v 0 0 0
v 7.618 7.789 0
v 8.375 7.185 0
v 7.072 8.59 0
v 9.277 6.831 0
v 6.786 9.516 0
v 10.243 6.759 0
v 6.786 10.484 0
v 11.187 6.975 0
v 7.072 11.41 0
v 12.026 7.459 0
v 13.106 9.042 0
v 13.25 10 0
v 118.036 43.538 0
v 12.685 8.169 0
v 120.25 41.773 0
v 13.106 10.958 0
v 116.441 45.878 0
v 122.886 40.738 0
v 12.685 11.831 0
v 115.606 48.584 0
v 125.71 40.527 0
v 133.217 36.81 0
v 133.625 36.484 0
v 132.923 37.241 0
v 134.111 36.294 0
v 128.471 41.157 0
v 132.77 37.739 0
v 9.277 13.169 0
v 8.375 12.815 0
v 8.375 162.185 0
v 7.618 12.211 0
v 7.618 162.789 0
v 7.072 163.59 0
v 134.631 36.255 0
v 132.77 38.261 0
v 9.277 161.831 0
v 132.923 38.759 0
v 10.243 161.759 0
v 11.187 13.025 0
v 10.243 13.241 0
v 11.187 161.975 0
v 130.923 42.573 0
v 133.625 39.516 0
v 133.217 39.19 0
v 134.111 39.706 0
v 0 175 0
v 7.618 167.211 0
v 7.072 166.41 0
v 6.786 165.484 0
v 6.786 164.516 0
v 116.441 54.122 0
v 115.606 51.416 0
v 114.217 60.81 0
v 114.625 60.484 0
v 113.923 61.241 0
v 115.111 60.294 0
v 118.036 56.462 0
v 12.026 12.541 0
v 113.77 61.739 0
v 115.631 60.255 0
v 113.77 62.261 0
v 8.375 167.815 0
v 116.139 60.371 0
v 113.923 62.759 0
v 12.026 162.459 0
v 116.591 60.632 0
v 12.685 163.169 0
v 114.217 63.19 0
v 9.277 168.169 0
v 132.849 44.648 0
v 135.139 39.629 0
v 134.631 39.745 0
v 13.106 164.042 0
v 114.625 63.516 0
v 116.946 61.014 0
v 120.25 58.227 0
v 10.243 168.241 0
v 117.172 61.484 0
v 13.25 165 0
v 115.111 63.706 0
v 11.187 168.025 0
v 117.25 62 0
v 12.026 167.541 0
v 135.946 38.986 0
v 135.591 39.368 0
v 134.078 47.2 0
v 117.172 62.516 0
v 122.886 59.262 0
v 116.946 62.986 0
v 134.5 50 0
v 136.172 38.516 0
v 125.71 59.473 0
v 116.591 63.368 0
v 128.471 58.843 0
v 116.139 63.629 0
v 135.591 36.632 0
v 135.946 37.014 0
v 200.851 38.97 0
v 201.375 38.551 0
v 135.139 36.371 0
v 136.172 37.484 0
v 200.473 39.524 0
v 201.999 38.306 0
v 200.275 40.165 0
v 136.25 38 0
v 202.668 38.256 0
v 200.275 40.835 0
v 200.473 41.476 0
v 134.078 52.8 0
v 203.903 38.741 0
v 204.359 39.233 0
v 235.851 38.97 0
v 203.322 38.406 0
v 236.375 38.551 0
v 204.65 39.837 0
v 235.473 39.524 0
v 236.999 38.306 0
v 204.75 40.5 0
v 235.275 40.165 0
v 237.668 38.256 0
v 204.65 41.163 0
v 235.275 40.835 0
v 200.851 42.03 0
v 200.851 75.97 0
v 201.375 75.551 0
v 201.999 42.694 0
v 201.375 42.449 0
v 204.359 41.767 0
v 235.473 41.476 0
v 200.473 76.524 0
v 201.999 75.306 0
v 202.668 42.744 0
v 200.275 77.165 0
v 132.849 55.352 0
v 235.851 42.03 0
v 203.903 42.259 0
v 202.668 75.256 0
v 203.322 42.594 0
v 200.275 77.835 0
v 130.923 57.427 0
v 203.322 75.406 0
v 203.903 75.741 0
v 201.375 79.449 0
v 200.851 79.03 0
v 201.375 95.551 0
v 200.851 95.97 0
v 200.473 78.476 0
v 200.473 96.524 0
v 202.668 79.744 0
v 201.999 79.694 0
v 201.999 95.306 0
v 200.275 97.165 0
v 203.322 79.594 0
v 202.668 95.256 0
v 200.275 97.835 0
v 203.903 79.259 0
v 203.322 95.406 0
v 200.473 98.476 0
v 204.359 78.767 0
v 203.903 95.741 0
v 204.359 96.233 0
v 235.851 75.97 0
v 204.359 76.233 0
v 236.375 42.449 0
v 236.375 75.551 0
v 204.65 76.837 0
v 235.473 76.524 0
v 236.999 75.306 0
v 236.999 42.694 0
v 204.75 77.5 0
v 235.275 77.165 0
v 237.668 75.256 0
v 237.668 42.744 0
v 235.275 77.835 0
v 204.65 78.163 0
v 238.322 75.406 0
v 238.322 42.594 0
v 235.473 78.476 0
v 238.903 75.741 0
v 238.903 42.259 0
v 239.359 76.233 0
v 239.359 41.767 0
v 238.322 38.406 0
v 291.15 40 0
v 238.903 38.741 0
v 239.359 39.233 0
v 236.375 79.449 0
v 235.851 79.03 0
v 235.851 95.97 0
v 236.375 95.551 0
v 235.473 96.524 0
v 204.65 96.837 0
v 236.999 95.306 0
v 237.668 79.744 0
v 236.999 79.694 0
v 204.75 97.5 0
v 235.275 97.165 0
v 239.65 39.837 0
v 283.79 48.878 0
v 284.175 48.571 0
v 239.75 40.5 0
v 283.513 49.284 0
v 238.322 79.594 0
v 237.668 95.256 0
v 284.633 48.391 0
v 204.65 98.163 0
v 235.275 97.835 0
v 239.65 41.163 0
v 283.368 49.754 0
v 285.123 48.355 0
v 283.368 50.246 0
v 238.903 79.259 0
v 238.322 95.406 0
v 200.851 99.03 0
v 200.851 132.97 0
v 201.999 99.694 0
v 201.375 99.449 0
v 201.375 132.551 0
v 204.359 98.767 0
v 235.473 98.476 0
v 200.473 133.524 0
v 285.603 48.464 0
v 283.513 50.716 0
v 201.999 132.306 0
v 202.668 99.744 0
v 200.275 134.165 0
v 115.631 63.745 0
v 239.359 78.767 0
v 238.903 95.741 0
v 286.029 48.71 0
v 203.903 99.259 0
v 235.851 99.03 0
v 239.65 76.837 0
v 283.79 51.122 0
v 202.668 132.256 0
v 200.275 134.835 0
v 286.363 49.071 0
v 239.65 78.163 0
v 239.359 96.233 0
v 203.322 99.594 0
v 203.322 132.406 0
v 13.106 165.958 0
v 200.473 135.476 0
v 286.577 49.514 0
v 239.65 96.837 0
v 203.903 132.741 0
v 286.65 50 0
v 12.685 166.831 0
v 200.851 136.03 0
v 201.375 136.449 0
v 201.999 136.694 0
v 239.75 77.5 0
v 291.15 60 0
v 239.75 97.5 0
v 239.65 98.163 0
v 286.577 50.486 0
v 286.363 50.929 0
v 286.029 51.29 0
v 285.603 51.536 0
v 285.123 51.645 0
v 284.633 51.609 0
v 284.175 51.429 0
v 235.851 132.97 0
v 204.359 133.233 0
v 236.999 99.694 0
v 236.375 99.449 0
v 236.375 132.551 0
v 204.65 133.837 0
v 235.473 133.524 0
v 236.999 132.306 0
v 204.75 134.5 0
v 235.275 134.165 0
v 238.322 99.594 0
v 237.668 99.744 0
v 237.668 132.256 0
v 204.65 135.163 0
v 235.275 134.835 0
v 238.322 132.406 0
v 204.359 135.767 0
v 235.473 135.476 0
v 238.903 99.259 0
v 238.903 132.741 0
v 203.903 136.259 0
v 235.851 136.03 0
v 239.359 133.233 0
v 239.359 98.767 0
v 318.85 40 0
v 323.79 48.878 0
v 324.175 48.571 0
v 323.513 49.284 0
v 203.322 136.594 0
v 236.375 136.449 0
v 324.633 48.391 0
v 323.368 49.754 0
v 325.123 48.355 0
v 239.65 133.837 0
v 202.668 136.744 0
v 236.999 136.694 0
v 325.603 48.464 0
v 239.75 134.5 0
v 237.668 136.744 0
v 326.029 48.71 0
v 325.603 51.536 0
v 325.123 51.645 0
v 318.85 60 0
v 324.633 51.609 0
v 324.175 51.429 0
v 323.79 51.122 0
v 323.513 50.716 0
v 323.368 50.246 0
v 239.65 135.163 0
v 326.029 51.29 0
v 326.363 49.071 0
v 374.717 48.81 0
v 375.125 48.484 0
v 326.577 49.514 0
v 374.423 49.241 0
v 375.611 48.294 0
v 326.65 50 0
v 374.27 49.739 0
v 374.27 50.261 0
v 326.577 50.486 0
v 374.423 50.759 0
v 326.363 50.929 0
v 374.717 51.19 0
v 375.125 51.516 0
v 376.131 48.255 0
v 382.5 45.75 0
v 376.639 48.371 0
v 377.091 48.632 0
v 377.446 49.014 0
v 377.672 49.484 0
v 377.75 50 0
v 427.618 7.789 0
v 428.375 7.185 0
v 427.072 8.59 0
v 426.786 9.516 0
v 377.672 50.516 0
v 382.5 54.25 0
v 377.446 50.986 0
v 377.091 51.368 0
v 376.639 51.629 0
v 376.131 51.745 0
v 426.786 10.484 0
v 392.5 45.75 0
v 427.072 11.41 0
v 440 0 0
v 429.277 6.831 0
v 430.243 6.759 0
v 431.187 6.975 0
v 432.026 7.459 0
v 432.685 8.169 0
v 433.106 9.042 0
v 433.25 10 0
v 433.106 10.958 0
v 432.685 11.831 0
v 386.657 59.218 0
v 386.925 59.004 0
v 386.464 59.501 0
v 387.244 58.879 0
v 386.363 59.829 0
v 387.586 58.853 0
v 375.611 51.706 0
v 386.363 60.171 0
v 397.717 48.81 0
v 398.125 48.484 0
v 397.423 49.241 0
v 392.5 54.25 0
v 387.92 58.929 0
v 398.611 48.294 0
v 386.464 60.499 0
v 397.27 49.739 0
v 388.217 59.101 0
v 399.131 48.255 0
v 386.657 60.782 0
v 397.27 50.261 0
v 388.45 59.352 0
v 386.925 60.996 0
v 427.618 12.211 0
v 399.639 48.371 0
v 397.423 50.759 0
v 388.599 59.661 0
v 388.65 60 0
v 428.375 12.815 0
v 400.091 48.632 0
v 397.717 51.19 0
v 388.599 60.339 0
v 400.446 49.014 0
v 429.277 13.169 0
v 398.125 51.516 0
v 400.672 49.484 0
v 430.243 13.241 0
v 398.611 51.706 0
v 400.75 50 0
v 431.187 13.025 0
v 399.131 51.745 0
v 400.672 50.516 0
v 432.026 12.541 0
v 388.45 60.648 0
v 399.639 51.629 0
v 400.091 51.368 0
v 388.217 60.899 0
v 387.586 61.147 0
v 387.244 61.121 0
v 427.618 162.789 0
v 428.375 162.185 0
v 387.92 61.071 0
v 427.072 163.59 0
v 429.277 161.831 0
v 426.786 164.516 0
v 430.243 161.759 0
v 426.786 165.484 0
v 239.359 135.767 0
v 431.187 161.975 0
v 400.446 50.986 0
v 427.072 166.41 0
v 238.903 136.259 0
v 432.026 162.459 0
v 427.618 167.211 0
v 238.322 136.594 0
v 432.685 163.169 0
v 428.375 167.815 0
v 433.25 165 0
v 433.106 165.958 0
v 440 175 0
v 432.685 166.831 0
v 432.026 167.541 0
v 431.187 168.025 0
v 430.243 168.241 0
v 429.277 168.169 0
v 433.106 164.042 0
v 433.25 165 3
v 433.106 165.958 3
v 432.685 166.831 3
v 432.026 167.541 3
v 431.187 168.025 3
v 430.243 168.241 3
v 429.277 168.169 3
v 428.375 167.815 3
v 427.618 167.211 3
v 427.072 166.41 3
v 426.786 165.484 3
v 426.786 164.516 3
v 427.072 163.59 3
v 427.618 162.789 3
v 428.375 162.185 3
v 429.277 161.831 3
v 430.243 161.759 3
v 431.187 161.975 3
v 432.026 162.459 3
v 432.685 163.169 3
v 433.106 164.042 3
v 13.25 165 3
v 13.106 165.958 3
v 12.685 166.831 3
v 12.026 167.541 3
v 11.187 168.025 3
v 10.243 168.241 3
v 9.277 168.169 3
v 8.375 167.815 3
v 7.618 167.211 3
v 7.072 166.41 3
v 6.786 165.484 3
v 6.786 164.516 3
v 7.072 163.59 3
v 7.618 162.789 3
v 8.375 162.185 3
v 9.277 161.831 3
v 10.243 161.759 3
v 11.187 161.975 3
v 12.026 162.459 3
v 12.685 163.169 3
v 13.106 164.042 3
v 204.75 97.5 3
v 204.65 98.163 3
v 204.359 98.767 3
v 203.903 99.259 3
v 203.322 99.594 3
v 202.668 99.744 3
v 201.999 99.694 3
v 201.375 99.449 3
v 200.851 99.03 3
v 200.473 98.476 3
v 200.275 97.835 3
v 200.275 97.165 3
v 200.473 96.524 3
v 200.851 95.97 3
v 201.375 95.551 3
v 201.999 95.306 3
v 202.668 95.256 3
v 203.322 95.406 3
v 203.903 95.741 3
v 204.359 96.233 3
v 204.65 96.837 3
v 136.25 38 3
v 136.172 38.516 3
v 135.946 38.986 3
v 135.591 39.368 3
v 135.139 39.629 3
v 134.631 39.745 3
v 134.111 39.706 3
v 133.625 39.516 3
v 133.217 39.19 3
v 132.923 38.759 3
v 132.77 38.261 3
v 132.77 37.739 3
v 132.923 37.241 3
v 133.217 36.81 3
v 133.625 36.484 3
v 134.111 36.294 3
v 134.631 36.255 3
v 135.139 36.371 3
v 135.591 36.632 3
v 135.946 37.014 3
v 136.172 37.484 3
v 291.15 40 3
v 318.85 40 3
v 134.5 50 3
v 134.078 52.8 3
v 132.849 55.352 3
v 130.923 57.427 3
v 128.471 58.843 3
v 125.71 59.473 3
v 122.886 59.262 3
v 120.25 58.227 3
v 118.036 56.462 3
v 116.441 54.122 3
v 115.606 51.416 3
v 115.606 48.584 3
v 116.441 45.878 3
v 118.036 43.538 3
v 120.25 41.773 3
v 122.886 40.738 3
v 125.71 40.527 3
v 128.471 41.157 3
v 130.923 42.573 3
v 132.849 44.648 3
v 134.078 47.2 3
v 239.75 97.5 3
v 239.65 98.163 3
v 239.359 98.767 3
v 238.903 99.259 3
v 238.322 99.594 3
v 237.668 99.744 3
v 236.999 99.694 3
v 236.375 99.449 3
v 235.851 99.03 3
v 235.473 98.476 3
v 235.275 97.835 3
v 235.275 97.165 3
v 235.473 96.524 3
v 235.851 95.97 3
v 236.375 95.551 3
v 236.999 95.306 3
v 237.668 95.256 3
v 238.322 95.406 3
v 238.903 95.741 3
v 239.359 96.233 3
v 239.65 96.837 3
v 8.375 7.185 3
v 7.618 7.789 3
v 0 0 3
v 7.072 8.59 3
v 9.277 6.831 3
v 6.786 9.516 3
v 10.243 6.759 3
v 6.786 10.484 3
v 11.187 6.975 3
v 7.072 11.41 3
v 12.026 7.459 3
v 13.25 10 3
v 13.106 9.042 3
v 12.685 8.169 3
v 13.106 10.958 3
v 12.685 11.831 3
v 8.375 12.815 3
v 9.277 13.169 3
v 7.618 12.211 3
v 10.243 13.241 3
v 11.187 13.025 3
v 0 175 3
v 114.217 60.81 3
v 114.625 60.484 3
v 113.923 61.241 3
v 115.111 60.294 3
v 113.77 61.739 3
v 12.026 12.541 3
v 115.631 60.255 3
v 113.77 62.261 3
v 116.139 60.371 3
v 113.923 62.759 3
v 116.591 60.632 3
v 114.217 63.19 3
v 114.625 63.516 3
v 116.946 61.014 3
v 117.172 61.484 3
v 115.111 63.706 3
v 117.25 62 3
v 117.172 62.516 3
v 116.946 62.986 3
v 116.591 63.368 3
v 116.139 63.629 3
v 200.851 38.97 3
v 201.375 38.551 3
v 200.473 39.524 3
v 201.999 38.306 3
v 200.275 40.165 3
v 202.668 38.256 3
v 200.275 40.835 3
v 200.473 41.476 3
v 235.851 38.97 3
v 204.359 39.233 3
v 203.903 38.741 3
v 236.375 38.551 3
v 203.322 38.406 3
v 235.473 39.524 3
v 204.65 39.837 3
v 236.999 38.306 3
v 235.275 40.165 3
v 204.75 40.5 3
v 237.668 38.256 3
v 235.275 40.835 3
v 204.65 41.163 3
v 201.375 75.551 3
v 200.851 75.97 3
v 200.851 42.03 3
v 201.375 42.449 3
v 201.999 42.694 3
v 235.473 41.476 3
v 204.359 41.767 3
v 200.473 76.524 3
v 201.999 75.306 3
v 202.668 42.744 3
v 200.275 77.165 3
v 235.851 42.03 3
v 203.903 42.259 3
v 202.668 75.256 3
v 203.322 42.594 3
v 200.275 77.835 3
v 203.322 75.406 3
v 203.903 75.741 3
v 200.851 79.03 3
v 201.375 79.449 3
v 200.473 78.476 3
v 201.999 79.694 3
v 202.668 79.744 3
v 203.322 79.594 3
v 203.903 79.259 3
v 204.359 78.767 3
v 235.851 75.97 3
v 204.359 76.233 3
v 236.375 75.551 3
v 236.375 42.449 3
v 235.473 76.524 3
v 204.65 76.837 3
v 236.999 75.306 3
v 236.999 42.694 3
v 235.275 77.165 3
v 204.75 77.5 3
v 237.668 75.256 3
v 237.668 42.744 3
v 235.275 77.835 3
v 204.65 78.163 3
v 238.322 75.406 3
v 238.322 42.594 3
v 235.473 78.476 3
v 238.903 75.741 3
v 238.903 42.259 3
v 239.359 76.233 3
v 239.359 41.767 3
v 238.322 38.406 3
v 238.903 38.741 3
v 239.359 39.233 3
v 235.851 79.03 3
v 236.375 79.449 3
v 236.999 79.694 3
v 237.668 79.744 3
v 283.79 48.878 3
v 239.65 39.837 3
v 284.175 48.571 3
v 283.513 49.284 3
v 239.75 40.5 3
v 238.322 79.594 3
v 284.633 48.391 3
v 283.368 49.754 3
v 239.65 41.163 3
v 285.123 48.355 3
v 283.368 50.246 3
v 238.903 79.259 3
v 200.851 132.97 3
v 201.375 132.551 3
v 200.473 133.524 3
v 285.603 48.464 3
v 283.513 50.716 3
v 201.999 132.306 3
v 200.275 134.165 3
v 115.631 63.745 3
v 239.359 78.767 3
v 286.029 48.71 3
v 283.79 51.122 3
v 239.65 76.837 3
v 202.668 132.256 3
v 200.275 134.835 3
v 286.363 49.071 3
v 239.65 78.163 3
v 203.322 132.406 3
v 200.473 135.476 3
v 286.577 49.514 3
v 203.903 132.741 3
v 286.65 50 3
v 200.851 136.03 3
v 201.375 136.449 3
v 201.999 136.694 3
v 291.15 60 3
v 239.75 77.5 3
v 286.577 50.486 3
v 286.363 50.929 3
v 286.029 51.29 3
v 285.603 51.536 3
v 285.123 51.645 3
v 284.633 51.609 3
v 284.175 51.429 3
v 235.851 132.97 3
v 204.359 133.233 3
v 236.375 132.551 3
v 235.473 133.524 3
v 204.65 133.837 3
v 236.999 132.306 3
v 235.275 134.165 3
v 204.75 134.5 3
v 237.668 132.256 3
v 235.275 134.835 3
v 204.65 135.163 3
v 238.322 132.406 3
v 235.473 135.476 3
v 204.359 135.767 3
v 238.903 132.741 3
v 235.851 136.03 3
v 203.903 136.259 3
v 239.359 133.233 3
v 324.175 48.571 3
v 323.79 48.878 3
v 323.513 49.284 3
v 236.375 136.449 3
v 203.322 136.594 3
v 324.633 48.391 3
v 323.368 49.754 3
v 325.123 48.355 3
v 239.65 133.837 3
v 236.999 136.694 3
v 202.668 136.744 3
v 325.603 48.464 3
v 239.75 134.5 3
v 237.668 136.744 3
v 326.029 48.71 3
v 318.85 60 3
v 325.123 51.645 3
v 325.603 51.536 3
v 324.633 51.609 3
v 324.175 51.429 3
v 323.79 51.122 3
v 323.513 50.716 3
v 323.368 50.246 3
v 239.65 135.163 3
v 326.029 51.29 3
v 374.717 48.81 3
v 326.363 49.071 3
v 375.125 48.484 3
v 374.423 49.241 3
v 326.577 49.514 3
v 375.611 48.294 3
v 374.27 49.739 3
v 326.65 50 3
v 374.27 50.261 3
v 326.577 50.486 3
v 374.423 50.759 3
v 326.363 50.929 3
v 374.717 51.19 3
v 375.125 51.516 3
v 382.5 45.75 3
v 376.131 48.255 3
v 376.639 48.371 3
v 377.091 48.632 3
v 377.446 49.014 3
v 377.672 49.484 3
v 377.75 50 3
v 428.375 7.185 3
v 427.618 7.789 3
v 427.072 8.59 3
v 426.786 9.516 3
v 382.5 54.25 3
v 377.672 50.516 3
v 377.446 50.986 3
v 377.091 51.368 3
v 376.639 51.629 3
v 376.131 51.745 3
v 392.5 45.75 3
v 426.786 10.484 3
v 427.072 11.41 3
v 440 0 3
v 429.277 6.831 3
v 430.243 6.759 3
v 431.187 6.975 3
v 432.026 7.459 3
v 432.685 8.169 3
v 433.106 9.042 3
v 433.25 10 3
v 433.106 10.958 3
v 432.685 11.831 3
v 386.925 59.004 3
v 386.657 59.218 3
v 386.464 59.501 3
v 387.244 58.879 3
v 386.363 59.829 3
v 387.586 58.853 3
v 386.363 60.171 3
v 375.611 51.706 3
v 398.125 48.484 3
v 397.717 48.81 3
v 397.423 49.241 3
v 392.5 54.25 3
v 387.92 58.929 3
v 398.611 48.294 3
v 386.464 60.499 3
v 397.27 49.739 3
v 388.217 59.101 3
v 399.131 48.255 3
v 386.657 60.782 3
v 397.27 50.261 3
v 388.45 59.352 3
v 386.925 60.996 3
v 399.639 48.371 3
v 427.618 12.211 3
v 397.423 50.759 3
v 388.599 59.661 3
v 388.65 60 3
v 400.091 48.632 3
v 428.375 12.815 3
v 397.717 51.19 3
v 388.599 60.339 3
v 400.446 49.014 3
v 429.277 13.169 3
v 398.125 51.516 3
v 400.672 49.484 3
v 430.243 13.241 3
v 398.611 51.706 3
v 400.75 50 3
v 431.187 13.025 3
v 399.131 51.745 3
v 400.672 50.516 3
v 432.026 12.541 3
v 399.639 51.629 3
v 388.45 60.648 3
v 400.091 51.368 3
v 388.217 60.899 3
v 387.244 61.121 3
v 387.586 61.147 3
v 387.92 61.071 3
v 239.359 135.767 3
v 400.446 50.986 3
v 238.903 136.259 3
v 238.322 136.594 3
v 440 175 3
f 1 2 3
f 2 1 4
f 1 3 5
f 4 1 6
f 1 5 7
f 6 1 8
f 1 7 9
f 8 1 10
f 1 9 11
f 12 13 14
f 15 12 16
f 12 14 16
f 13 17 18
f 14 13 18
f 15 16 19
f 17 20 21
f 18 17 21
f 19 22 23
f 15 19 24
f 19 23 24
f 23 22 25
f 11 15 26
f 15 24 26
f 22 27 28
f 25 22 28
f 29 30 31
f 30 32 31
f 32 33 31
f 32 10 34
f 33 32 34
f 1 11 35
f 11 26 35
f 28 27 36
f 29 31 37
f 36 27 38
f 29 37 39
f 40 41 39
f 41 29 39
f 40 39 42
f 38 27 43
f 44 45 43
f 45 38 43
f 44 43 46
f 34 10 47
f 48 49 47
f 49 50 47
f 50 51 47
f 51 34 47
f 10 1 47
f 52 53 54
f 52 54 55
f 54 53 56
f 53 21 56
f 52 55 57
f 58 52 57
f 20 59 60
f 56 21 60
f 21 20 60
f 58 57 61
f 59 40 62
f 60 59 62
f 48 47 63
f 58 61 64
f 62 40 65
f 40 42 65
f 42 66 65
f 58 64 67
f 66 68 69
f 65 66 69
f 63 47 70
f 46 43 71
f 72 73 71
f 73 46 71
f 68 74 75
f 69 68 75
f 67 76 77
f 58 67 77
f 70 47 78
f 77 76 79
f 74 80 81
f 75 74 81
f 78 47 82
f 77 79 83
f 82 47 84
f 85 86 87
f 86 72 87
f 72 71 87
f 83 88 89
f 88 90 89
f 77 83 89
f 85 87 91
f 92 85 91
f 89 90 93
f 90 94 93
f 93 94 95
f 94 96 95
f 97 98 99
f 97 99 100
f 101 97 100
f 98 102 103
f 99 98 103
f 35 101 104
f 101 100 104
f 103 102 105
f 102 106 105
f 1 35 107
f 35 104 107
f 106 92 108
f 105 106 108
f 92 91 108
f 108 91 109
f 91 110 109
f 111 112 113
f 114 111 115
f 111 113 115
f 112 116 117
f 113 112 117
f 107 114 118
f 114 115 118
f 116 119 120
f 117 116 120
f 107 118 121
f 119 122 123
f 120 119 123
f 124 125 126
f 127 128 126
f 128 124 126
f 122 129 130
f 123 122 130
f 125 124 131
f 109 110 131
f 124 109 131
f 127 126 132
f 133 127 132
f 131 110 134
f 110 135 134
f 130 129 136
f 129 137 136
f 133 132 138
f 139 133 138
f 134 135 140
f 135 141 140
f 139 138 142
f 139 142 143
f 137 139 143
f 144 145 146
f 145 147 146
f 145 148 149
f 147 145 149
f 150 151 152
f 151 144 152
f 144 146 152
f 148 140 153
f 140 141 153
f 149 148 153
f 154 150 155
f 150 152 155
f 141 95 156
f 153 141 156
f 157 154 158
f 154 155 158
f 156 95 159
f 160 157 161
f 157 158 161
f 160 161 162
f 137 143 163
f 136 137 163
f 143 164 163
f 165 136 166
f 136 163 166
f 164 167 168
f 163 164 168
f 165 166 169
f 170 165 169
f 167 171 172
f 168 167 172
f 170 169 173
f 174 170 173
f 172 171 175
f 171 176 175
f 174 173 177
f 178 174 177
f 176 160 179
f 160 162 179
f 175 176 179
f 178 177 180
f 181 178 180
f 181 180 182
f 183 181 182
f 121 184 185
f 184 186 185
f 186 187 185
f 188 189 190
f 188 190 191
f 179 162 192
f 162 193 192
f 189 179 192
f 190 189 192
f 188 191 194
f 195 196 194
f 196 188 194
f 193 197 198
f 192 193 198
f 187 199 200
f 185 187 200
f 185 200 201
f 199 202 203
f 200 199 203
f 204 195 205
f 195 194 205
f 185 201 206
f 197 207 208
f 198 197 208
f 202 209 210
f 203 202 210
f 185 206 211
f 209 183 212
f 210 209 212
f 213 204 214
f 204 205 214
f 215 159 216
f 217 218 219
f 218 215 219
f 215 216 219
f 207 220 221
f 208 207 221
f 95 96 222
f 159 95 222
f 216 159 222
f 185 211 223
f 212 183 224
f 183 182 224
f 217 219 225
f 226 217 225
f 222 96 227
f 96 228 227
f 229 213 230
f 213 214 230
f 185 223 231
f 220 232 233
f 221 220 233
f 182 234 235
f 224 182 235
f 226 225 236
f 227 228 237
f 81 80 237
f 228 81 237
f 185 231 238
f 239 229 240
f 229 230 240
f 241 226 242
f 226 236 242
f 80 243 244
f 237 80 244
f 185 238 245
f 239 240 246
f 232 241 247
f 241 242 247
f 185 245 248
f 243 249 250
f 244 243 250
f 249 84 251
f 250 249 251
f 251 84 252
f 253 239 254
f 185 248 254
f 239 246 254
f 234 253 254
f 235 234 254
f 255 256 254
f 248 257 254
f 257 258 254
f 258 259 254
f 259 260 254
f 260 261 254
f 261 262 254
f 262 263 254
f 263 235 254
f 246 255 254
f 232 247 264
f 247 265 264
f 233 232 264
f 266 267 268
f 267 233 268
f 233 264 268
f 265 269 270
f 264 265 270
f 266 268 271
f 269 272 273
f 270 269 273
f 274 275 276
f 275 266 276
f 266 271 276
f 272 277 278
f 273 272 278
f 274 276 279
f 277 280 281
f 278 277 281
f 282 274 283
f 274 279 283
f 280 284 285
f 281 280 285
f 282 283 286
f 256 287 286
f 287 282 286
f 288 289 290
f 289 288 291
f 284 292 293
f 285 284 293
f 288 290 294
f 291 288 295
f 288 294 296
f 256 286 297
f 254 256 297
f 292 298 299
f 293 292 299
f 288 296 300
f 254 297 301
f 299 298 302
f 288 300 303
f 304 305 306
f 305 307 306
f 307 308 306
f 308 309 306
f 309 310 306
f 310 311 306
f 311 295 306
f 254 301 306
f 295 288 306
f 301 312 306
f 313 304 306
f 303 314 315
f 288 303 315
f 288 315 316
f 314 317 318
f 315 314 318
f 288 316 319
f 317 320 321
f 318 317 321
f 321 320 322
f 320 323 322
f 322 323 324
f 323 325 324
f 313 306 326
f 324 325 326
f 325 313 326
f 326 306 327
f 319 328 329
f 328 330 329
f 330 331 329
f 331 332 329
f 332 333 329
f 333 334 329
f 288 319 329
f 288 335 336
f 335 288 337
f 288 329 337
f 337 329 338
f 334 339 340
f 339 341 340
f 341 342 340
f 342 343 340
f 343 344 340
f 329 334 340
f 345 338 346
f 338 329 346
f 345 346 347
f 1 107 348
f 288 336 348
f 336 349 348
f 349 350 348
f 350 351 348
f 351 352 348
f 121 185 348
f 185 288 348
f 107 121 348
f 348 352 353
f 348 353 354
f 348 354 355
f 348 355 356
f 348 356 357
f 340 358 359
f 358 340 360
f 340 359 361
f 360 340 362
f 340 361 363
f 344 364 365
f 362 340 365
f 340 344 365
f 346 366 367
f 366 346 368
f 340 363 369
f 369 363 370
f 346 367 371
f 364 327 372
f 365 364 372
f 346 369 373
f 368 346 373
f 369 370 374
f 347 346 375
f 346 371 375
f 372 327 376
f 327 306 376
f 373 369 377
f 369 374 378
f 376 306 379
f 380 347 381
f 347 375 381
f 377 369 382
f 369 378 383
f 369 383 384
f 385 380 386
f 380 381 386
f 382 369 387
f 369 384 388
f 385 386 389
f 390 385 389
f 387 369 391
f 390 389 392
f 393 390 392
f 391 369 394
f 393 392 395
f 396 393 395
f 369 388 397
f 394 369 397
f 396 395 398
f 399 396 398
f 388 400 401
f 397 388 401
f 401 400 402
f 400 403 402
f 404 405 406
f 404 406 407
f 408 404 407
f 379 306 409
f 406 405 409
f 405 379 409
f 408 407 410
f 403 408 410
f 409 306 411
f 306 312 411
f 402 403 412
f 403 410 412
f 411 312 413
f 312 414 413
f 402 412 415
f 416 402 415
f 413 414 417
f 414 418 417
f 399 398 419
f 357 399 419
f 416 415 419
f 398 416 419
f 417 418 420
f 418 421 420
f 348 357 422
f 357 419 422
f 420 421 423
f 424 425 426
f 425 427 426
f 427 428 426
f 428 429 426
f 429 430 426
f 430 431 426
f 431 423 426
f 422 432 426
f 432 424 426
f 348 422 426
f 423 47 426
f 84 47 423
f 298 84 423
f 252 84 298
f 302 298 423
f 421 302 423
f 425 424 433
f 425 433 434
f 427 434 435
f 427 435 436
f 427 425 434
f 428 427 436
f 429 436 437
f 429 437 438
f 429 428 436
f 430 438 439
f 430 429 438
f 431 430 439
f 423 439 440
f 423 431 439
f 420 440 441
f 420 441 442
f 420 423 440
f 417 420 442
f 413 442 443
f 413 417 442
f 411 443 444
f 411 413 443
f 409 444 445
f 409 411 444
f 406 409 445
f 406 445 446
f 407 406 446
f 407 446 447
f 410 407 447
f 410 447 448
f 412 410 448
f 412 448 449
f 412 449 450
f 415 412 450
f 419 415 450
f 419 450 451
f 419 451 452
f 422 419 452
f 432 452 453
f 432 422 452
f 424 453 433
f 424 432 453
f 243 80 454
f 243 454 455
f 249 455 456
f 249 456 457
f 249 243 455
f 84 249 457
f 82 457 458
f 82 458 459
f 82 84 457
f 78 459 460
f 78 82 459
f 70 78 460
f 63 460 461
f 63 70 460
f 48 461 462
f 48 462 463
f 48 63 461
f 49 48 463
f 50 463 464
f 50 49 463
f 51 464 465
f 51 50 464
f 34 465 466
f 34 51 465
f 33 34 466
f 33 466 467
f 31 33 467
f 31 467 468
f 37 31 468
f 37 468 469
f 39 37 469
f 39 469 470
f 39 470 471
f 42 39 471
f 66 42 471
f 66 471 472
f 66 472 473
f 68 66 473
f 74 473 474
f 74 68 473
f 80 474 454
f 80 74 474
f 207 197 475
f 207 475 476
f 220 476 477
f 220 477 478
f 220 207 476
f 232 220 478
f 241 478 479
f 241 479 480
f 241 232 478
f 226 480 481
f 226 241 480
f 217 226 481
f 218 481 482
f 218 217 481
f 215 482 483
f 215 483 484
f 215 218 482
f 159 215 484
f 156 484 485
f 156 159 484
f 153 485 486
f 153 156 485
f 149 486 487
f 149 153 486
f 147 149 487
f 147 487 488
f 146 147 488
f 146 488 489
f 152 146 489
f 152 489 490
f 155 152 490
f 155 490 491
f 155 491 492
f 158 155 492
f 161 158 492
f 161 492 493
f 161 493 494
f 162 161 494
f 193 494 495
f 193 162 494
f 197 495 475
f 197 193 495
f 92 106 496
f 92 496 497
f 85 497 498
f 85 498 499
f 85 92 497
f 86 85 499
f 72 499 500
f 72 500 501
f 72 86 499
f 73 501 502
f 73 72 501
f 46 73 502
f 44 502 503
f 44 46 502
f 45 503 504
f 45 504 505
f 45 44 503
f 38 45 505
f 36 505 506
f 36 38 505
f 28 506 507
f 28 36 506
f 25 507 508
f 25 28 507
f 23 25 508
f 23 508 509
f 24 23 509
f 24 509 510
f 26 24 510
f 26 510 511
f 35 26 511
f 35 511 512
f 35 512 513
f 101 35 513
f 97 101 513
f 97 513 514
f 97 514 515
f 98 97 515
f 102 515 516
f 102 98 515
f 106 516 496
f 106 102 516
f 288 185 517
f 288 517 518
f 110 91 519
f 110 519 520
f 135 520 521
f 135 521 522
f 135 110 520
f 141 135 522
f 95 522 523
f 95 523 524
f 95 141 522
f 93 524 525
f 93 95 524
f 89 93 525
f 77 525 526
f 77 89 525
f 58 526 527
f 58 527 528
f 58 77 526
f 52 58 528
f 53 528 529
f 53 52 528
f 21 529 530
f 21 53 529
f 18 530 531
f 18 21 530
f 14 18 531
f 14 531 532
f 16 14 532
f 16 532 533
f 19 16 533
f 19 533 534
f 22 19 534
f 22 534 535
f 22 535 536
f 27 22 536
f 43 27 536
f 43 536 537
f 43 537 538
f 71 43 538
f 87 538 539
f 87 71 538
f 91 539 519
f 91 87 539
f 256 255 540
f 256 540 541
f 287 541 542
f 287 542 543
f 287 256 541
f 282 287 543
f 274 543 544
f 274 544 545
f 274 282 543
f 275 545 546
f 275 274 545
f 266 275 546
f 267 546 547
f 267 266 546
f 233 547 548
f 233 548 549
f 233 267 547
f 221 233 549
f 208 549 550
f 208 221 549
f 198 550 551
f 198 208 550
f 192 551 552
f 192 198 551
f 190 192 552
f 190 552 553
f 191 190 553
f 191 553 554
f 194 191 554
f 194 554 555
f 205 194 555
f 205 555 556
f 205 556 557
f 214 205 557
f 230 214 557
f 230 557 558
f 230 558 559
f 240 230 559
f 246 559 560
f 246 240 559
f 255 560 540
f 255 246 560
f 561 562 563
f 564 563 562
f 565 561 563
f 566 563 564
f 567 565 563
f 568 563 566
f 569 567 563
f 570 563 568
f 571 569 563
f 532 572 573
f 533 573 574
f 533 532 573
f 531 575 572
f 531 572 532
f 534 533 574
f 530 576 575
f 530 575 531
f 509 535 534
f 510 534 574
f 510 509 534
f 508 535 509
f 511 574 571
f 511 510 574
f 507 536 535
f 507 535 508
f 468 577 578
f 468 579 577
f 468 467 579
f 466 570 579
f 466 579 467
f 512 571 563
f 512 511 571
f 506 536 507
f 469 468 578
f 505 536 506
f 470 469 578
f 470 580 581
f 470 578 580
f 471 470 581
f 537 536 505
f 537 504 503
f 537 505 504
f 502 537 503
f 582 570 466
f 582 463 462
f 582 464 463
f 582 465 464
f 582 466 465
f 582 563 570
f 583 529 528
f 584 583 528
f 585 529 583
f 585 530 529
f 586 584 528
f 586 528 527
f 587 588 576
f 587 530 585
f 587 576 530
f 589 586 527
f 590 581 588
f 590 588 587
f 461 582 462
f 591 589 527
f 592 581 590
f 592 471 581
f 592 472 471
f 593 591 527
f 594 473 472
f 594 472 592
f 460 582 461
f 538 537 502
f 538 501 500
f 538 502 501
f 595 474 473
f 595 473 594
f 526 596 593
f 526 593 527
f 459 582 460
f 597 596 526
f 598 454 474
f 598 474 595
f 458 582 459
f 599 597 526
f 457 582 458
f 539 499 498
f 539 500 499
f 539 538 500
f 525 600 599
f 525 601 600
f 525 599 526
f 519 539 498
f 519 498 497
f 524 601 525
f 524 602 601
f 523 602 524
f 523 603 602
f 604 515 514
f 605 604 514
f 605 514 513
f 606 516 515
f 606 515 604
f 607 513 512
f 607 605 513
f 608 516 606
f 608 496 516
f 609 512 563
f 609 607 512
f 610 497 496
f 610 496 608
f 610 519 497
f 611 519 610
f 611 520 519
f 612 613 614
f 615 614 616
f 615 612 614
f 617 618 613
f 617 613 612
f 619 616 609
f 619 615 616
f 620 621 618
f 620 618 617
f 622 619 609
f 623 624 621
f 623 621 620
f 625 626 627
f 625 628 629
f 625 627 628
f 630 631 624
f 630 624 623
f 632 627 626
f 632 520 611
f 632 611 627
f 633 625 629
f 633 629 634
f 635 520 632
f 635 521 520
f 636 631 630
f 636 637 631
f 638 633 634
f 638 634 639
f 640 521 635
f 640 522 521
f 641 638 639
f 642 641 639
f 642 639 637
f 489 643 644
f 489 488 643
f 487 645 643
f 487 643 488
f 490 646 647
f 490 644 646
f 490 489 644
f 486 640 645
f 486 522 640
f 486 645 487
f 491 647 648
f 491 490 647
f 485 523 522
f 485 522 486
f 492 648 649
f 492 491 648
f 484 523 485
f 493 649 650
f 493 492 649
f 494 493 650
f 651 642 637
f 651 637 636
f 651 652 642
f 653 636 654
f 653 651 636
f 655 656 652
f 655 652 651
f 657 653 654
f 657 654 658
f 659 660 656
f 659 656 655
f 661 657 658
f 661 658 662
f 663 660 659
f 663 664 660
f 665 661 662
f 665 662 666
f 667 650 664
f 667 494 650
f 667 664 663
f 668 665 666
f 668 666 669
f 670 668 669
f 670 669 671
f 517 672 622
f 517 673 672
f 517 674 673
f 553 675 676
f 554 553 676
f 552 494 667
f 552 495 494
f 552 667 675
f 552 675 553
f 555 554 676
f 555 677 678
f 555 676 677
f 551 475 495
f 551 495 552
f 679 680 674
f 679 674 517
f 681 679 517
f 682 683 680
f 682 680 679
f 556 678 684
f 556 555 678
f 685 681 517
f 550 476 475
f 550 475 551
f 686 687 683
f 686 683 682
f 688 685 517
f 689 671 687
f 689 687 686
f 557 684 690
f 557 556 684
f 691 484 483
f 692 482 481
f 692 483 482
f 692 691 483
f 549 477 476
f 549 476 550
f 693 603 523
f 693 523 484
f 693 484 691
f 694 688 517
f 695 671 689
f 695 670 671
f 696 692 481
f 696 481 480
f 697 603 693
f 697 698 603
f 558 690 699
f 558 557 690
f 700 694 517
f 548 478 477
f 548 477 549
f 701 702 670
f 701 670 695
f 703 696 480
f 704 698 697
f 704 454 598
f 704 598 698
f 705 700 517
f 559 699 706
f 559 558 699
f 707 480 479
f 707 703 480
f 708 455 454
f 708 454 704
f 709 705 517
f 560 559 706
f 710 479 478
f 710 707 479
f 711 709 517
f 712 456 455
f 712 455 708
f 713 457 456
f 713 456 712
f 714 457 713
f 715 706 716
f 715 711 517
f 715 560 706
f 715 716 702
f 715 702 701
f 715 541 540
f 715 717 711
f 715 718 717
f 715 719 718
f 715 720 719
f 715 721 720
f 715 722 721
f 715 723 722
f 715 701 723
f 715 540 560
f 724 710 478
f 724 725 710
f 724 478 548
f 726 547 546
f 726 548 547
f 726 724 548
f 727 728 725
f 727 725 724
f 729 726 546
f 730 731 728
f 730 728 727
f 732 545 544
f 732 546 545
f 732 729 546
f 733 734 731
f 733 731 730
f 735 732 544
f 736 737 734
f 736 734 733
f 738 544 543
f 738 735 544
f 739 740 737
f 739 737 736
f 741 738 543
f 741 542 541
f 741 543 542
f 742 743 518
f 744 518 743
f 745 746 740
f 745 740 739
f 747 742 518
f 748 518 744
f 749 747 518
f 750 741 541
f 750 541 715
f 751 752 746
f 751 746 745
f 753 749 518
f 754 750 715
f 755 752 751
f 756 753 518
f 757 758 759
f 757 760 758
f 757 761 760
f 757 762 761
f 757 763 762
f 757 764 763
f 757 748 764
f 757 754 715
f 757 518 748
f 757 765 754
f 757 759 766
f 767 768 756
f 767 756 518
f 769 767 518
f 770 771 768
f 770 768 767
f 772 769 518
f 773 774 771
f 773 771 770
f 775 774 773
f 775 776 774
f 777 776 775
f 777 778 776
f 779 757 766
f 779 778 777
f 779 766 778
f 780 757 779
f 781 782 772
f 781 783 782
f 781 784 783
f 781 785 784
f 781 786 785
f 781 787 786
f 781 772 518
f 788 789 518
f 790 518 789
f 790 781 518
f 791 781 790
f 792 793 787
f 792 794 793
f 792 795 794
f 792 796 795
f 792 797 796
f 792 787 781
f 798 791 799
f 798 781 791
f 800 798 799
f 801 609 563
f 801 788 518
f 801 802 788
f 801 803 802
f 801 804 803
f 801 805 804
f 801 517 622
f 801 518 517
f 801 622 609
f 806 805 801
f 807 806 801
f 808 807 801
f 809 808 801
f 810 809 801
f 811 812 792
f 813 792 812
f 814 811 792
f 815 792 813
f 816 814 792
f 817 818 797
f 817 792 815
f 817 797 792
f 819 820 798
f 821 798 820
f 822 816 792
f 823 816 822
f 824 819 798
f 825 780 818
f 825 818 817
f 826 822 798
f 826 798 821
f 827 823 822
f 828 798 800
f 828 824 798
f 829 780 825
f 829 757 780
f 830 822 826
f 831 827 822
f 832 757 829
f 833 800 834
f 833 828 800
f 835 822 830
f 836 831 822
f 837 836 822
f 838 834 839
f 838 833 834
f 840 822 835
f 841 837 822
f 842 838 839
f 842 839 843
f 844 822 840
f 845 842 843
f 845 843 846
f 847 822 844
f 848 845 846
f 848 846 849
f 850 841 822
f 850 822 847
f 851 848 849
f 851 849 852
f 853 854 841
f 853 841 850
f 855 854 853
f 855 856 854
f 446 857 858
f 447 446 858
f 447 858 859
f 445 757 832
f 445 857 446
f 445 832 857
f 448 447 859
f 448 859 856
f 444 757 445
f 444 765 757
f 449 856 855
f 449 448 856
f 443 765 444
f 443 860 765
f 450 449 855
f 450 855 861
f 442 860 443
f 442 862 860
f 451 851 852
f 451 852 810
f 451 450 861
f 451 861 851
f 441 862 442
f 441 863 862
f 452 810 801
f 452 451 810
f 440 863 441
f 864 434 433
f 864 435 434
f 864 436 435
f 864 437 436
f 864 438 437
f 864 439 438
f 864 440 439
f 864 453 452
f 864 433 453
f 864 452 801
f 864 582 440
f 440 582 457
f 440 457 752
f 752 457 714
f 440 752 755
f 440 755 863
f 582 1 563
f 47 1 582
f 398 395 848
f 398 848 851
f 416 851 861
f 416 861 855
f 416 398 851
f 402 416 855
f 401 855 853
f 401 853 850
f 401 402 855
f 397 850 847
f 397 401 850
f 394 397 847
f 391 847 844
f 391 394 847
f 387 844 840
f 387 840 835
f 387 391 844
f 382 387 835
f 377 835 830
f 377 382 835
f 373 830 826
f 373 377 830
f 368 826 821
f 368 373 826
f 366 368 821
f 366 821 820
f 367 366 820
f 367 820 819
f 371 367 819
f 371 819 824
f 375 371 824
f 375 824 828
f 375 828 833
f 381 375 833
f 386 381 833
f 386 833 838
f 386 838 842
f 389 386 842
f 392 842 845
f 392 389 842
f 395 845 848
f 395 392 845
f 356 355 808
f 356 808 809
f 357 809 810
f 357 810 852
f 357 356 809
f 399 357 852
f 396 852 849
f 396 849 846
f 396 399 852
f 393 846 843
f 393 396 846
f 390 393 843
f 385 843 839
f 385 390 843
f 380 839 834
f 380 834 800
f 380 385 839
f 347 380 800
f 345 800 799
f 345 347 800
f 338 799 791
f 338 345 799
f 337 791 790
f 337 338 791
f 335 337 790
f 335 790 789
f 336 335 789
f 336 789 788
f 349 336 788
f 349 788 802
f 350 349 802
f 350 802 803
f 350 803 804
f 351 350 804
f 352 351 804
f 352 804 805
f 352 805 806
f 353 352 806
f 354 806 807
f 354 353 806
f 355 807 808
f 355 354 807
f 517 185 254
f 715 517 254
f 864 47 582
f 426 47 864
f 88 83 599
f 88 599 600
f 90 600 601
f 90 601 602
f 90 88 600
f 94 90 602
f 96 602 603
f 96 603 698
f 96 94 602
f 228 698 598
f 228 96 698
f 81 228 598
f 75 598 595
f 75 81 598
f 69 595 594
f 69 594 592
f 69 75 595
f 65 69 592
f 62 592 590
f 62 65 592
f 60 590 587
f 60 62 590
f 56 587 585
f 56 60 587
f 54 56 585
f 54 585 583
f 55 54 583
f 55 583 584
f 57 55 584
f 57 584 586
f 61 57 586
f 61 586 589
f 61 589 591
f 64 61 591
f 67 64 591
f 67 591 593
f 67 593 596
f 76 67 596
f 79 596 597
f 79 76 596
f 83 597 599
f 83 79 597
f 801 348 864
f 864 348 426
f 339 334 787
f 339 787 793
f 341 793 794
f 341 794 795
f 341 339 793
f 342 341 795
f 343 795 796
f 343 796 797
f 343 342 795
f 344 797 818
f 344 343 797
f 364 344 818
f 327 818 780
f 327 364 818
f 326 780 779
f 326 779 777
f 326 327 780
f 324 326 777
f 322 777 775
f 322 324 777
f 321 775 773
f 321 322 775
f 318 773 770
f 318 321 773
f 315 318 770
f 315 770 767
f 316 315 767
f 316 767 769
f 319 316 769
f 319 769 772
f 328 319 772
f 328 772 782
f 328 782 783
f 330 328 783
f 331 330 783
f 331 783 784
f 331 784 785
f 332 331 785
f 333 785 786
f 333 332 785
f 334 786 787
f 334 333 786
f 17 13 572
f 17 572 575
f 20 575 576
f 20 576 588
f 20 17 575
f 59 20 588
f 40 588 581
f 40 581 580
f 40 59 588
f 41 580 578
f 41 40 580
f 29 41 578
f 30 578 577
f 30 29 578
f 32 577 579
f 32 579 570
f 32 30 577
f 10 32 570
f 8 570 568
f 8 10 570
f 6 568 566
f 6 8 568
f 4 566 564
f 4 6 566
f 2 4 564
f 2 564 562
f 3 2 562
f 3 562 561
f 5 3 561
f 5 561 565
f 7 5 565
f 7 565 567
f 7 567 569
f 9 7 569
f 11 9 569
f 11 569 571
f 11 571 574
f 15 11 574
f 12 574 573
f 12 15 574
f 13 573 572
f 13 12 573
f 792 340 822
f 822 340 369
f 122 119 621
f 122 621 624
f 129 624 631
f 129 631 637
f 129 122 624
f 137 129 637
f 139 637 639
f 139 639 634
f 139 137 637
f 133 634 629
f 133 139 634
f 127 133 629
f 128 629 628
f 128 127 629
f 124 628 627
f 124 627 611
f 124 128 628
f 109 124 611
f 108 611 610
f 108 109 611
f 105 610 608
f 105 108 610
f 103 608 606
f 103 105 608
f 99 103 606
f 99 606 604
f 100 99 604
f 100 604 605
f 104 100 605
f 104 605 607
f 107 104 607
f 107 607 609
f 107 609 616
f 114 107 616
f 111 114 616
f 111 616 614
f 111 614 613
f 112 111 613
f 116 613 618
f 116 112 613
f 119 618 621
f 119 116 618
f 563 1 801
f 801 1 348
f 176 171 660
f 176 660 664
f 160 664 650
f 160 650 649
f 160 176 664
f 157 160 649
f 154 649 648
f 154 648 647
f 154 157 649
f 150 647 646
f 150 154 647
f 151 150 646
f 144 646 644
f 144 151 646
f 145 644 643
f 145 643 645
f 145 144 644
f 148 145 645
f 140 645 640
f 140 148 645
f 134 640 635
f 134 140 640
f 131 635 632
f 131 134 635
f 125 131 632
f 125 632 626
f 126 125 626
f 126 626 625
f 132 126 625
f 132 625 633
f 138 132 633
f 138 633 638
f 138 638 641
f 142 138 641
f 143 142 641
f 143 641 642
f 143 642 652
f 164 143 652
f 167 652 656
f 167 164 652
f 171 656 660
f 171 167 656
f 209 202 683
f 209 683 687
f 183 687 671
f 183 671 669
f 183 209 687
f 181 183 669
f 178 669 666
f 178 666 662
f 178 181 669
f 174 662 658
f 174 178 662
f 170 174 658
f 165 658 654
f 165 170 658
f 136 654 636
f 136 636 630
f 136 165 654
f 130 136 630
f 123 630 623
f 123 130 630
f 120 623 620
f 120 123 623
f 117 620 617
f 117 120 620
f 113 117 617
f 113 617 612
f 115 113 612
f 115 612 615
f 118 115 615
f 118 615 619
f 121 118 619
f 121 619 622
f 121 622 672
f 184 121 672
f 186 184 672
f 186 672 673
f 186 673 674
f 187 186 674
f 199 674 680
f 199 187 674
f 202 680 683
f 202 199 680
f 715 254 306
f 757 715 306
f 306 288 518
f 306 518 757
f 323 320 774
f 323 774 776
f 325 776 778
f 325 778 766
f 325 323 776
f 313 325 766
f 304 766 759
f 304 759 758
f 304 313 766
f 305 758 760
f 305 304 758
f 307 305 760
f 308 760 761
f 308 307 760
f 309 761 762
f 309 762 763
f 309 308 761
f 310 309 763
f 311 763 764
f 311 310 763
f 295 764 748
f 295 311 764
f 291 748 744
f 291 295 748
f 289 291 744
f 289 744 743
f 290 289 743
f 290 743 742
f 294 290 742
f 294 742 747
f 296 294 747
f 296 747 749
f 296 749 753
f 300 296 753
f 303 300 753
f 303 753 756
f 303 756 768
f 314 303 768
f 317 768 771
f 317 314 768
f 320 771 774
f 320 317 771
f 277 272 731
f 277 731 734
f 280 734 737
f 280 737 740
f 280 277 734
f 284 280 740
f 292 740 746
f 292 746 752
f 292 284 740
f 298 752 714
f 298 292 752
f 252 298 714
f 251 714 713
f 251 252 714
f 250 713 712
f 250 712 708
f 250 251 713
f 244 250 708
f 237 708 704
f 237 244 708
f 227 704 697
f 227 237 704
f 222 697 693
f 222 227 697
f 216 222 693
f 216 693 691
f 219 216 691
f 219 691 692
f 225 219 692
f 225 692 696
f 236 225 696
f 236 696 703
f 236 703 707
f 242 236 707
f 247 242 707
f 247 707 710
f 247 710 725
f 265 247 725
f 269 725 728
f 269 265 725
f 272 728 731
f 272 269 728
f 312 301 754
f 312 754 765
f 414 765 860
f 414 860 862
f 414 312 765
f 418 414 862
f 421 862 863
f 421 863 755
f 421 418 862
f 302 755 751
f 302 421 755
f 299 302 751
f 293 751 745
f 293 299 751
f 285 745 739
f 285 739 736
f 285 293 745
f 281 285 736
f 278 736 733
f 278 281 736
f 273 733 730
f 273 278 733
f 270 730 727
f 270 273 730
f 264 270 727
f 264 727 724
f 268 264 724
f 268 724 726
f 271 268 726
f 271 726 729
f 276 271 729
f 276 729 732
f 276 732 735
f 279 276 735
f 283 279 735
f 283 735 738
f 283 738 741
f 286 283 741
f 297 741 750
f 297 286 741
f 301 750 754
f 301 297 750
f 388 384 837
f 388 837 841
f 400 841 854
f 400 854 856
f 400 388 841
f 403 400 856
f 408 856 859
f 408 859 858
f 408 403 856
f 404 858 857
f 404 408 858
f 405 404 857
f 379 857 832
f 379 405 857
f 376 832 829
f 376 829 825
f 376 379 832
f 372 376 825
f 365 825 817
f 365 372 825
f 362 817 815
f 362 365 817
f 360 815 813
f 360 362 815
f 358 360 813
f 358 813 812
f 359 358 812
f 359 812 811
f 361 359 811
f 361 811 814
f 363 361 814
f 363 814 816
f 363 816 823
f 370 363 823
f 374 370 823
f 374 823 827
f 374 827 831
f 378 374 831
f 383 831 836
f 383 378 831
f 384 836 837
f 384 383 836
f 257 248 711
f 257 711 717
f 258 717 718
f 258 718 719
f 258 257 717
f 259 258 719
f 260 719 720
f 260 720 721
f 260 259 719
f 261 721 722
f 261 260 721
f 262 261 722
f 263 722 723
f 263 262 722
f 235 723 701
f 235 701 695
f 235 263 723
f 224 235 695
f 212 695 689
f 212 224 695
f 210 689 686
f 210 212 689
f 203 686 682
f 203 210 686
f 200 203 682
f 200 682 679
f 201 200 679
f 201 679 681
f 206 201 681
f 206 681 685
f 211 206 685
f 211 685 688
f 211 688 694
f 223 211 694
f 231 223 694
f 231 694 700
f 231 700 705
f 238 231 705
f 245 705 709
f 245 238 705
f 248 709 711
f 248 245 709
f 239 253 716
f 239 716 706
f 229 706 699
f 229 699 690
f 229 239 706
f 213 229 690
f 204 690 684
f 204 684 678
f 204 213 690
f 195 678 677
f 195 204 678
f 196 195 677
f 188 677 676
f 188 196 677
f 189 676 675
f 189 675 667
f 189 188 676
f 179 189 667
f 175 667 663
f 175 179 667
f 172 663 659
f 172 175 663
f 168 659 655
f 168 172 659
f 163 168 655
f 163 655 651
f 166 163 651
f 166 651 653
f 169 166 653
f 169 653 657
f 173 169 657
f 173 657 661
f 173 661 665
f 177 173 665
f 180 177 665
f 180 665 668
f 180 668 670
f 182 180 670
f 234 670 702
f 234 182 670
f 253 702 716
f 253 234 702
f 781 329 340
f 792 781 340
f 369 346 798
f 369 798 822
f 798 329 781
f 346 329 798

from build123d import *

# Parameters (mm, degrees)
SKETCH1_W           = 440
SKETCH1_H           = 175
SKETCH1_R           = 9.5
SKETCH1_R_2         = 1.75
SKETCH1_R_3         = 1.65
SKETCH1_R_4         = 1.15
SKETCH1_R_5         = 3.25
SKETCH1_R_6         = 2.25
SKETCH1_W_2         = 27.7
SKETCH1_H_2         = 20
SKETCH1_W_3         = 10
SKETCH1_H_3         = 8.5
BOSS_EXTRUDE1_DEPTH = 3


with BuildPart() as part:
    # Sketch1 → Boss-Extrude1 (new body)
    with BuildSketch(Plane.XY):
        with Locations((220, 87.5)):
            Rectangle(SKETCH1_W, SKETCH1_H)
        with Locations((125, 50)):
            Circle(SKETCH1_R, mode=Mode.SUBTRACT)
        with Locations((115.5, 62)):
            Circle(SKETCH1_R_2, mode=Mode.SUBTRACT)
        with Locations((134.5, 38)):
            Circle(SKETCH1_R_2, mode=Mode.SUBTRACT)
        with Locations((285, 50)):
            Circle(SKETCH1_R_3, mode=Mode.SUBTRACT)
        with Locations((325, 50)):
            Circle(SKETCH1_R_3, mode=Mode.SUBTRACT)
        with Locations((387.5, 60)):
            Circle(SKETCH1_R_4, mode=Mode.SUBTRACT)
        with Locations((376, 50)):
            Circle(SKETCH1_R_2, mode=Mode.SUBTRACT)
        with Locations((399, 50)):
            Circle(SKETCH1_R_2, mode=Mode.SUBTRACT)
        with Locations((10, 165)):
            Circle(SKETCH1_R_5, mode=Mode.SUBTRACT)
        with Locations((10, 10)):
            Circle(SKETCH1_R_5, mode=Mode.SUBTRACT)
        with Locations((430, 10)):
            Circle(SKETCH1_R_5, mode=Mode.SUBTRACT)
        with Locations((430, 165)):
            Circle(SKETCH1_R_5, mode=Mode.SUBTRACT)
        with Locations((202.5, 134.5)):
            Circle(SKETCH1_R_6, mode=Mode.SUBTRACT)
        with Locations((202.5, 97.5)):
            Circle(SKETCH1_R_6, mode=Mode.SUBTRACT)
        with Locations((237.5, 134.5)):
            Circle(SKETCH1_R_6, mode=Mode.SUBTRACT)
        with Locations((237.5, 97.5)):
            Circle(SKETCH1_R_6, mode=Mode.SUBTRACT)
        with Locations((237.5, 77.5)):
            Circle(SKETCH1_R_6, mode=Mode.SUBTRACT)
        with Locations((237.5, 40.5)):
            Circle(SKETCH1_R_6, mode=Mode.SUBTRACT)
        with Locations((202.5, 77.5)):
            Circle(SKETCH1_R_6, mode=Mode.SUBTRACT)
        with Locations((202.5, 40.5)):
            Circle(SKETCH1_R_6, mode=Mode.SUBTRACT)
        with Locations((305, 50)):
            Rectangle(SKETCH1_W_2, SKETCH1_H_2, mode=Mode.SUBTRACT)
        with Locations((387.5, 50)):
            Rectangle(SKETCH1_W_3, SKETCH1_H_3, mode=Mode.SUBTRACT)
    extrude(amount=BOSS_EXTRUDE1_DEPTH)


solid = part.part
